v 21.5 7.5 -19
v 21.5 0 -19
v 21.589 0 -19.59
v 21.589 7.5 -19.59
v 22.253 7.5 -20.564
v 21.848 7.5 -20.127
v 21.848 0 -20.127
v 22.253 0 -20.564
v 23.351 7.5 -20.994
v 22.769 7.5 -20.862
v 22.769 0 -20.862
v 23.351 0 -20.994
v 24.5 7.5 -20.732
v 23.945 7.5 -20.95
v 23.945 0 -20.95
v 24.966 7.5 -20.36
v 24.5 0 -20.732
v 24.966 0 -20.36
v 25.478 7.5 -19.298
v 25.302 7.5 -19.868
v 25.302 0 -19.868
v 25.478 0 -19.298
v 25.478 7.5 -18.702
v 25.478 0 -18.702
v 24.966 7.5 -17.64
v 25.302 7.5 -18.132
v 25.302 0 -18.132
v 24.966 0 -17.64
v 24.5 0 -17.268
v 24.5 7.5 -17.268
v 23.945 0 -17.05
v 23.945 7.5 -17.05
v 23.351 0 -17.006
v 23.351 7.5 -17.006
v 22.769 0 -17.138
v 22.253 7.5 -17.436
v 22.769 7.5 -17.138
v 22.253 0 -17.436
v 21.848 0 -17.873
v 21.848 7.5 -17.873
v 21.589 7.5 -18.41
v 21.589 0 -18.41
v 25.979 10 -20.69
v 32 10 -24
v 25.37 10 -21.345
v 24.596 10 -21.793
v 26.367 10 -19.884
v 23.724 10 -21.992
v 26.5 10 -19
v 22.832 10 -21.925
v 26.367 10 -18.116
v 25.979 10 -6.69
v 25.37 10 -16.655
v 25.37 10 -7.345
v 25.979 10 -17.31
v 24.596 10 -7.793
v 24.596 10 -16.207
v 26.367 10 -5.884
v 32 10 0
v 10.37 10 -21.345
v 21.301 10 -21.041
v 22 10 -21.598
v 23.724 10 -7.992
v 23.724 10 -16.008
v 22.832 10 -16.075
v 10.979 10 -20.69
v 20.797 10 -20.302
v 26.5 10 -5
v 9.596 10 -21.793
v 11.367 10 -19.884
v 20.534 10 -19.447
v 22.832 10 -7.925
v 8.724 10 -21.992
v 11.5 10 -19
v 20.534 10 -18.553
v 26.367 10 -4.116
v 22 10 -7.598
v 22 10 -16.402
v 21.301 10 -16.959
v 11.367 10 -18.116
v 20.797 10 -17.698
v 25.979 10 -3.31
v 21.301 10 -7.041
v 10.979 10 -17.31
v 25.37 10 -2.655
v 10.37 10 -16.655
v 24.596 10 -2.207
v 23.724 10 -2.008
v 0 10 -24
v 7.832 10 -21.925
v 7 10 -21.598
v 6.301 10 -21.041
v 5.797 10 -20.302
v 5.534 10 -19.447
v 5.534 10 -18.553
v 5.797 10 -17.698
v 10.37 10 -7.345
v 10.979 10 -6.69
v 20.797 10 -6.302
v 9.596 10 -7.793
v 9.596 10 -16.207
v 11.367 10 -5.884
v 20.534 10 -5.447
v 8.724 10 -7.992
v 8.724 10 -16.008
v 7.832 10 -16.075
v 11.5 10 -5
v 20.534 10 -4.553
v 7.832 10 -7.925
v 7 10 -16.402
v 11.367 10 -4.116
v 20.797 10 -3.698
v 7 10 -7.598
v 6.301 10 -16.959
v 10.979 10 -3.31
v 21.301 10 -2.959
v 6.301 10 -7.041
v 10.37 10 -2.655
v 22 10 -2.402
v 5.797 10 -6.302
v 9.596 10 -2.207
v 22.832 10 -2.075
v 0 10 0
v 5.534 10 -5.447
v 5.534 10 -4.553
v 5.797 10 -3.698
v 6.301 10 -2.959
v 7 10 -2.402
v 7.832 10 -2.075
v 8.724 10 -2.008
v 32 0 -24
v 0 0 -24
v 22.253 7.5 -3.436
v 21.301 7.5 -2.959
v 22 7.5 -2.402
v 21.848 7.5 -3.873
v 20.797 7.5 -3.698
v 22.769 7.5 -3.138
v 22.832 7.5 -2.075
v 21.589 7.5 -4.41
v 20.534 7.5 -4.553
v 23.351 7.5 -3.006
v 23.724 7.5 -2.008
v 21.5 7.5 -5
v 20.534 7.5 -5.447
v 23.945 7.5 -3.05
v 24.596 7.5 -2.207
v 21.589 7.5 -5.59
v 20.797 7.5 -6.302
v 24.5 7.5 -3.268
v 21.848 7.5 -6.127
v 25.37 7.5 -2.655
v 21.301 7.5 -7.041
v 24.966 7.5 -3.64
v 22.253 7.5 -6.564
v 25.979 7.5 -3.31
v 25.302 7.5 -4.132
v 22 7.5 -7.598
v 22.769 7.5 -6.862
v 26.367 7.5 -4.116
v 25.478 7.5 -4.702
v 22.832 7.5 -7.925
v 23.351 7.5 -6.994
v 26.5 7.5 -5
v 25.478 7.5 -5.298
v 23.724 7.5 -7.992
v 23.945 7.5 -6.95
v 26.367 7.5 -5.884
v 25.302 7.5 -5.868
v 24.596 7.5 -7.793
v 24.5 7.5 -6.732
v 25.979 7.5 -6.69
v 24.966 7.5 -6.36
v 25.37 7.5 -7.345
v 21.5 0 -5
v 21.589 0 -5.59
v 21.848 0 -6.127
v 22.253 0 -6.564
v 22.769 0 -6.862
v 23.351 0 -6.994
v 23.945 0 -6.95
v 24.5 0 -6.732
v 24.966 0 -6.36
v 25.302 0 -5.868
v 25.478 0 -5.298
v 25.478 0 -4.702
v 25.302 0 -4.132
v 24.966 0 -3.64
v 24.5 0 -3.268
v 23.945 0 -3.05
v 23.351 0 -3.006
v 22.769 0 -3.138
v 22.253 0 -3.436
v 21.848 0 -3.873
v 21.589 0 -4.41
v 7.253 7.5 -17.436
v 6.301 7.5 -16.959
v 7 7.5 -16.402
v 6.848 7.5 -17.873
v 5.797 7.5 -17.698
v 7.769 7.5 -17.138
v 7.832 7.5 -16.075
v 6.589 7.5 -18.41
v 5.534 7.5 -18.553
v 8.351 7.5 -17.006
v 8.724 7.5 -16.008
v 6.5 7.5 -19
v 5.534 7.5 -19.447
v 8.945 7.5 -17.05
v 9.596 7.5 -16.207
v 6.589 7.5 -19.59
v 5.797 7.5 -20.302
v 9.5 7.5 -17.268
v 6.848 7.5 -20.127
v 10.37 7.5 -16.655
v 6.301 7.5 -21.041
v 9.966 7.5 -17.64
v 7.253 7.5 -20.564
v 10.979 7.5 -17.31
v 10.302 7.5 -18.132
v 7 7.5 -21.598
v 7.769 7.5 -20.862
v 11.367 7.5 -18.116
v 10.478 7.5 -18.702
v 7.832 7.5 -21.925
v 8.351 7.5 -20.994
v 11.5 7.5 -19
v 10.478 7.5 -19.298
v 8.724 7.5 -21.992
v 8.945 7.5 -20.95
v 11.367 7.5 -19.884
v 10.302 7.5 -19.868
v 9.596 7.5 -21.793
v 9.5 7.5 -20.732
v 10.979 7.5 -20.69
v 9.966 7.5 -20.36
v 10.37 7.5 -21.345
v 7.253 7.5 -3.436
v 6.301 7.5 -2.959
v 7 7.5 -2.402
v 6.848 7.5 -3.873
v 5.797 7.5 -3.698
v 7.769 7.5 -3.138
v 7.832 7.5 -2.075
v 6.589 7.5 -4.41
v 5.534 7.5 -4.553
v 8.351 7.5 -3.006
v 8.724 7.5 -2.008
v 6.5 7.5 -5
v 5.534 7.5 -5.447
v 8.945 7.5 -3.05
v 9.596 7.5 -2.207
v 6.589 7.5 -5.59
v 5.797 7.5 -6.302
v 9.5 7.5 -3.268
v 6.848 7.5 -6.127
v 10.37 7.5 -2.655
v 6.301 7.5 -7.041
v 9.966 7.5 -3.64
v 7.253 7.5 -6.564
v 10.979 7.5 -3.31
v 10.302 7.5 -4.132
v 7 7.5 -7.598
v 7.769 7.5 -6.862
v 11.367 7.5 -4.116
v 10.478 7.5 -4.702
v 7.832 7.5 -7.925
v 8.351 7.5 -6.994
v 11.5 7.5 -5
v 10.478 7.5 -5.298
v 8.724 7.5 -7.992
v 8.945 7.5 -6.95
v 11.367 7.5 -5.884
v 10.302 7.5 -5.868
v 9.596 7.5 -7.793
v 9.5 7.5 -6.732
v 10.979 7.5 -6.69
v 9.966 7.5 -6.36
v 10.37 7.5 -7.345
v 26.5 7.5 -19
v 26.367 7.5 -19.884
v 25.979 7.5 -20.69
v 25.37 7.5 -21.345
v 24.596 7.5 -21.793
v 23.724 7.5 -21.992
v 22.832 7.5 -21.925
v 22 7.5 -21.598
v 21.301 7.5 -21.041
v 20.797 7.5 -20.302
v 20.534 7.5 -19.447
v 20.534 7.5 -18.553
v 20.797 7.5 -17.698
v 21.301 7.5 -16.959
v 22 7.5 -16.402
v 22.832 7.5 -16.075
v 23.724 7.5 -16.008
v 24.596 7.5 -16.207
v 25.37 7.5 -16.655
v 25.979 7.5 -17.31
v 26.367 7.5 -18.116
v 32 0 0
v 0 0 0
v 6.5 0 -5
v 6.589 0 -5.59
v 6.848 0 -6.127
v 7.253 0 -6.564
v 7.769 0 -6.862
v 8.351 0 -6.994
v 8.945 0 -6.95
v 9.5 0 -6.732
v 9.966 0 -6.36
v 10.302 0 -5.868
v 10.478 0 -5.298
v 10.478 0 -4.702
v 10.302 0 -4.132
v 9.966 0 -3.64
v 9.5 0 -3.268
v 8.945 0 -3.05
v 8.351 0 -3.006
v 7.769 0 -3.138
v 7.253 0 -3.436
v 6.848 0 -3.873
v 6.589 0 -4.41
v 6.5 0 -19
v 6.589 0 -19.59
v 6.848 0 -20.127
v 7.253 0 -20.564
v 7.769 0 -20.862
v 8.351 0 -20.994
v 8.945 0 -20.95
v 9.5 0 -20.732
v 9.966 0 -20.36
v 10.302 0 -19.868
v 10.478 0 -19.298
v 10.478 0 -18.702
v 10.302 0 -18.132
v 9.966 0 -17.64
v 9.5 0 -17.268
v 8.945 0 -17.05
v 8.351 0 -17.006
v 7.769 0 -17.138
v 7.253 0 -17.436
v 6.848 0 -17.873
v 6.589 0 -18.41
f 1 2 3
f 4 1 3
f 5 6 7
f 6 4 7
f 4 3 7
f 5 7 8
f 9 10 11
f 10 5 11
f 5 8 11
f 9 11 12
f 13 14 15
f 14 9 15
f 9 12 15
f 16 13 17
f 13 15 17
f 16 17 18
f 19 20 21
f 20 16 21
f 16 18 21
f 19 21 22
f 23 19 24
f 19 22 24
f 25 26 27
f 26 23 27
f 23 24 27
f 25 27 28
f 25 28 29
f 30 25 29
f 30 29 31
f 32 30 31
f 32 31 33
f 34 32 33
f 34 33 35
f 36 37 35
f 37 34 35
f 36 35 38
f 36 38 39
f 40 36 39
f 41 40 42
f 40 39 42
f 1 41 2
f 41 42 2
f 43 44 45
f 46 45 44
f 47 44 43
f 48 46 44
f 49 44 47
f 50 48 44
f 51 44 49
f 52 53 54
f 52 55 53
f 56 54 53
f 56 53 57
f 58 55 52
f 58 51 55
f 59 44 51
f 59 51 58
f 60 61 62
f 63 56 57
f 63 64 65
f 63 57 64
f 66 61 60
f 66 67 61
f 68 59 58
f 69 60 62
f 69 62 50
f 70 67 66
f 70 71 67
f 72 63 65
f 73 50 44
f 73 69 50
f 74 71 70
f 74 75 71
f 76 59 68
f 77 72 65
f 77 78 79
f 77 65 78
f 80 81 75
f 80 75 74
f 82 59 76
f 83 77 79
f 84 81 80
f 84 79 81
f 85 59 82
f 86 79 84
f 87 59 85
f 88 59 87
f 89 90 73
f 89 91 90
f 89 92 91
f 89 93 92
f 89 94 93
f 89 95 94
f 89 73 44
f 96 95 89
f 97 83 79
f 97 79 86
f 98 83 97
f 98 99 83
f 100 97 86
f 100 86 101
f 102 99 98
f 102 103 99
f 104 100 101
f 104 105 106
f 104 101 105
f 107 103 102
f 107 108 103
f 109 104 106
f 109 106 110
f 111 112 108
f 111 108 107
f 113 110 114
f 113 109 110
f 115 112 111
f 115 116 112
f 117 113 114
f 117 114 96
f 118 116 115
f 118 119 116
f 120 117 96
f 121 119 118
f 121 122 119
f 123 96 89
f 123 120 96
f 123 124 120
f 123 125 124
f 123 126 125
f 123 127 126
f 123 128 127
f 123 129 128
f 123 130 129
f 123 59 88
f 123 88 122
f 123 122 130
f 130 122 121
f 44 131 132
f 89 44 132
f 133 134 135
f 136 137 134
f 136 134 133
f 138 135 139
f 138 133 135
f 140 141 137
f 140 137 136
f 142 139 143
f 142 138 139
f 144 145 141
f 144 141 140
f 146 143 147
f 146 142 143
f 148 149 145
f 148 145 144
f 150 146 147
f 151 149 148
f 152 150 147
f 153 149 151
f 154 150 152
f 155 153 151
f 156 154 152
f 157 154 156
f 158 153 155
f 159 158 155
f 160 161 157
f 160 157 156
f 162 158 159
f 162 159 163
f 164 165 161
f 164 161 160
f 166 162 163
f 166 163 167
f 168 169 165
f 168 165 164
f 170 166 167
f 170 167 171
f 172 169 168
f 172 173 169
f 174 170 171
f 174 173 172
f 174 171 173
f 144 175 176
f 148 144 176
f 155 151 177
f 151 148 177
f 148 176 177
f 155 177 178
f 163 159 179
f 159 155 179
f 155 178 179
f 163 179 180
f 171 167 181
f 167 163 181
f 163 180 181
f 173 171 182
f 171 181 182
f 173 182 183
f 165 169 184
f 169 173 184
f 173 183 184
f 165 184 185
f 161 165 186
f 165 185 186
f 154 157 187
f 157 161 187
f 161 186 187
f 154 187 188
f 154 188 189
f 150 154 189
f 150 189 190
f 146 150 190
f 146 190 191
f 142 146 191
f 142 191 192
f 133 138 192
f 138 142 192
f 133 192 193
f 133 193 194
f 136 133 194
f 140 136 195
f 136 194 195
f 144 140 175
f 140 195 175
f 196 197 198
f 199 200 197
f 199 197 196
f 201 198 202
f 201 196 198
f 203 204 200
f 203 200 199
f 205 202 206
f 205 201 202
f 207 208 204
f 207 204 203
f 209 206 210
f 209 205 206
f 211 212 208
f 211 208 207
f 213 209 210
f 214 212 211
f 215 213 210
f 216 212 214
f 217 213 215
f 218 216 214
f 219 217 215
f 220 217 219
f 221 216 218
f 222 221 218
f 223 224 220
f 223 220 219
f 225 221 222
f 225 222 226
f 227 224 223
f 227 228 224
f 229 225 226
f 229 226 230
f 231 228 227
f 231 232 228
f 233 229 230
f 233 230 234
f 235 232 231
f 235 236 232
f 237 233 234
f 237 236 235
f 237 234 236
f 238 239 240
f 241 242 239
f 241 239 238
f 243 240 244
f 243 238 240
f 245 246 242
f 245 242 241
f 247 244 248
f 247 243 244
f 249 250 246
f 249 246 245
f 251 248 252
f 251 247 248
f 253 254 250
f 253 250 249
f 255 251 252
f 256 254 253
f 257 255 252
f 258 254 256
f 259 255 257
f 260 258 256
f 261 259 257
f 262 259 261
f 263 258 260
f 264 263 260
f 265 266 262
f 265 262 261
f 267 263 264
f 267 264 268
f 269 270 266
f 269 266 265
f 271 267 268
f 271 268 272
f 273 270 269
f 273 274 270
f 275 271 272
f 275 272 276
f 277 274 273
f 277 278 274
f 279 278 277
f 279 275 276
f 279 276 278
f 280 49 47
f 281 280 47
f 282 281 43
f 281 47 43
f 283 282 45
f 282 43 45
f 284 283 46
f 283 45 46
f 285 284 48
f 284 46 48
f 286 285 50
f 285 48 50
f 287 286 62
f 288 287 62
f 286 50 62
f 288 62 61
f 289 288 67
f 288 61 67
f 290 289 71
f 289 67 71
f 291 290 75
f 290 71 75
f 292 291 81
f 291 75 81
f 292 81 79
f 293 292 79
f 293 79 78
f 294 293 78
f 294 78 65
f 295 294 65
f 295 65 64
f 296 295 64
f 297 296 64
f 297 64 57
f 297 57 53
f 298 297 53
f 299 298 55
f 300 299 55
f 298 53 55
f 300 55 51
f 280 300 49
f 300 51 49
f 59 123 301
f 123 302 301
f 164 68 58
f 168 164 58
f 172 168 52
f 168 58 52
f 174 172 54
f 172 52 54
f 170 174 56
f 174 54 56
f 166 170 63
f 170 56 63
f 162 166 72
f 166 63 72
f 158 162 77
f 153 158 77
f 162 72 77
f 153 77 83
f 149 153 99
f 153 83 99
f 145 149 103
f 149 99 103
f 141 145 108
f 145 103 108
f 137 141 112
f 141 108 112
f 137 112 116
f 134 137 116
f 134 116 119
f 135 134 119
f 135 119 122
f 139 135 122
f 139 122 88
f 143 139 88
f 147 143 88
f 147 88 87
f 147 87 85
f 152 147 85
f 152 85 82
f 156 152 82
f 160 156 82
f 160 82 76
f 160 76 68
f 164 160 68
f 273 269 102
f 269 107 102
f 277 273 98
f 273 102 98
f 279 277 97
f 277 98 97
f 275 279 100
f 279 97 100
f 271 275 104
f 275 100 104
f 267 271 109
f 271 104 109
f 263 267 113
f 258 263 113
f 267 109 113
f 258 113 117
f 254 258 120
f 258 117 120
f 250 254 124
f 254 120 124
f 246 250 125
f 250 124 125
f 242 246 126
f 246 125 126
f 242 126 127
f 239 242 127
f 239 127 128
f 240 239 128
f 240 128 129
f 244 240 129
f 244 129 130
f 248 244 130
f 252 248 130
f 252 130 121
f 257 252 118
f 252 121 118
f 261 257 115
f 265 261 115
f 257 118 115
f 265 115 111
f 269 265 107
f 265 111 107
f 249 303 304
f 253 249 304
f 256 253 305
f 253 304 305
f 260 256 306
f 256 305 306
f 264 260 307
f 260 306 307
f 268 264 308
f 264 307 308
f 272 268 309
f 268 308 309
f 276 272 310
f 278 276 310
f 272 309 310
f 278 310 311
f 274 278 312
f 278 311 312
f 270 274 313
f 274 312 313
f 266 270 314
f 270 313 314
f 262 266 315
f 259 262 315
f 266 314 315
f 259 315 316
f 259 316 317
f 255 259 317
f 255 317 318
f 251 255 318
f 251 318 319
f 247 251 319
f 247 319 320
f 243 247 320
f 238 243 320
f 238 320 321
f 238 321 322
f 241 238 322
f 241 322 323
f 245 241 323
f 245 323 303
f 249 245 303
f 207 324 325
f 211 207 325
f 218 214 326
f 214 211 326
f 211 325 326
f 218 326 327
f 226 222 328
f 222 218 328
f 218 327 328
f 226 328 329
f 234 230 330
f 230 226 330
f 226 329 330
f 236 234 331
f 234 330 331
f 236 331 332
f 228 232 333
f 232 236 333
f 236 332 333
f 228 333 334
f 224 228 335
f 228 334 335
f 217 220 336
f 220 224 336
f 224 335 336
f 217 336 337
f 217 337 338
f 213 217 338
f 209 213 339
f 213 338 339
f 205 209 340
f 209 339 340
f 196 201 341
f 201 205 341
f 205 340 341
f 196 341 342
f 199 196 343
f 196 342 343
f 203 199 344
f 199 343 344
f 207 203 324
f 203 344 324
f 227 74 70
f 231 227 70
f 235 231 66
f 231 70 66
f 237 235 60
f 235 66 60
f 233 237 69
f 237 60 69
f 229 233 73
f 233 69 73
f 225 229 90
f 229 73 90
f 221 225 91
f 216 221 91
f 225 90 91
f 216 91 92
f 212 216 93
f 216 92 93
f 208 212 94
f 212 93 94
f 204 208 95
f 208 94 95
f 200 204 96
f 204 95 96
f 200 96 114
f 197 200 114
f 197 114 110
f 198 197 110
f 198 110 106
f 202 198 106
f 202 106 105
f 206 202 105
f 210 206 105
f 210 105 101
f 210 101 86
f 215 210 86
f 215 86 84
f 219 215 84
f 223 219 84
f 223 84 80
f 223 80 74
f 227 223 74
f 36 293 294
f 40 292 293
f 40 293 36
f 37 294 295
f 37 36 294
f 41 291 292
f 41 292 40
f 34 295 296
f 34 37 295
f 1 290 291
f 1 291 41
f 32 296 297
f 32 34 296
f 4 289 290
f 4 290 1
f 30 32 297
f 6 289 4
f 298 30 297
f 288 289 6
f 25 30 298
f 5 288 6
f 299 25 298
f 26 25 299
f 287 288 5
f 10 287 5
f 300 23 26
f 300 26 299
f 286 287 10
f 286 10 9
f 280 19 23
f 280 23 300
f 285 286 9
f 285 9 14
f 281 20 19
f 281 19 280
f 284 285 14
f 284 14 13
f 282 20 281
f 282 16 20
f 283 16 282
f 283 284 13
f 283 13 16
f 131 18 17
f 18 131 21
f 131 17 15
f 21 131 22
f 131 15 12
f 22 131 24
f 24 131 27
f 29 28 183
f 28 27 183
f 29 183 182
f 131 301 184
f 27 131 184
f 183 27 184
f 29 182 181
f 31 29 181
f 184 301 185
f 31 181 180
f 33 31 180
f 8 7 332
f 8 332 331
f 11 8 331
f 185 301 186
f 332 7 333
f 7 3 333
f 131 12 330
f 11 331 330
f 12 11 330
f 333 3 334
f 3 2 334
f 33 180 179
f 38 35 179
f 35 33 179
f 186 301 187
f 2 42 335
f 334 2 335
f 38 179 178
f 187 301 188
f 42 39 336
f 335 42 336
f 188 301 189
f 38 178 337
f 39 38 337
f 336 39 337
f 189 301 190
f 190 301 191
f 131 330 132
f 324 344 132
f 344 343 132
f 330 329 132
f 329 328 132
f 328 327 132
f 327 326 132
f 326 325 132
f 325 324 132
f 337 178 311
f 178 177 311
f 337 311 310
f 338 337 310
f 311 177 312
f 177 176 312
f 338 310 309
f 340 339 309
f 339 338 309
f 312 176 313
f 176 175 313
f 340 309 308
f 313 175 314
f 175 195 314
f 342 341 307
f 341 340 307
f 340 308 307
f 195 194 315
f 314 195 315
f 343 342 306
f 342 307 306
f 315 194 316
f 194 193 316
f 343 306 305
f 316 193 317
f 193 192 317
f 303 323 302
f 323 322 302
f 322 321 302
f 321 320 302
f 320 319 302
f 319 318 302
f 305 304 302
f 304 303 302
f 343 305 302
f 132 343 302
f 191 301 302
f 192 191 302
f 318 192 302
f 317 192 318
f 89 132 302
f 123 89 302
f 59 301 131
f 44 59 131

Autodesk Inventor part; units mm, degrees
ref_plane "YZ Plane" through (0, 0, 0) normal (1, 0, 0) x (0, 1, 0)
ref_plane "XZ Plane" through (0, 0, 0) normal (0, 1, 0) x (-1, 0, 0)
ref_plane "XY Plane" through (0, 0, 0) normal (0, 0, 1) x (1, 0, 0)
sketch "Sketch1" plane through (0, 0, 0) normal (0, 1, 0) x (-1, 0, 0)
  line L0 (0, 0) -> (-32, 0)
  line L1 (-32, 0) -> (-32, -24)
  line L2 (-32, -24) -> (0, -24)
  line L3 (0, -24) -> (0, 0)
  circle A0 centre (-8.5, -19) radius 2
  circle A1 centre (-23.5, -19) radius 2
  circle A2 centre (-23.5, -5) radius 2
  circle A3 centre (-8.5, -5) radius 2
  line L4 (-16, -24) -> (-16, 0) construction
  line L5 (0, -12) -> (-32, -12) construction
  dimension "d0" = 32
  dimension "d1" = 24
  dimension "x" = 4
  dimension "d3" = 4
  dimension "d4" = 4
  dimension "d5" = 4
  dimension "d6" = 15
  dimension "d7" = 7.5
  dimension "d8" = 14
  dimension "d9" = 7
extrude "Extrusion1" add sketch "Sketch1" along normal blind 10
sketch "Sketch2" plane through (0, 10, 0) normal (0, 1, 0) x (1, 0, 0)
  circle A0 centre (23.5, 5) radius 2 projected
  circle A1 centre (8.5, 19) radius 2 projected
  circle A2 centre (23.5, 19) radius 2 projected
  circle A3 centre (8.5, 5) radius 2 projected
  circle A4 centre (8.5, 19) radius 3
  circle A5 centre (23.5, 19) radius 3
  circle A6 centre (8.5, 5) radius 3
  circle A7 centre (23.5, 5) radius 3
  point P0 (0, 0)
  dimension "d12" = 6
  dimension "d13" = 6
  dimension "d14" = 6
  dimension "d15" = 6
extrude "Extrusion2" cut sketch "Sketch2" against normal blind 2.5 contours A3 | A4 | A5 | A6 | A7
equation "\"d3\" = x"
equation "\"d4\" = x"
equation "\"d5\" = x"
properties part number "WristMotorTensioner"
